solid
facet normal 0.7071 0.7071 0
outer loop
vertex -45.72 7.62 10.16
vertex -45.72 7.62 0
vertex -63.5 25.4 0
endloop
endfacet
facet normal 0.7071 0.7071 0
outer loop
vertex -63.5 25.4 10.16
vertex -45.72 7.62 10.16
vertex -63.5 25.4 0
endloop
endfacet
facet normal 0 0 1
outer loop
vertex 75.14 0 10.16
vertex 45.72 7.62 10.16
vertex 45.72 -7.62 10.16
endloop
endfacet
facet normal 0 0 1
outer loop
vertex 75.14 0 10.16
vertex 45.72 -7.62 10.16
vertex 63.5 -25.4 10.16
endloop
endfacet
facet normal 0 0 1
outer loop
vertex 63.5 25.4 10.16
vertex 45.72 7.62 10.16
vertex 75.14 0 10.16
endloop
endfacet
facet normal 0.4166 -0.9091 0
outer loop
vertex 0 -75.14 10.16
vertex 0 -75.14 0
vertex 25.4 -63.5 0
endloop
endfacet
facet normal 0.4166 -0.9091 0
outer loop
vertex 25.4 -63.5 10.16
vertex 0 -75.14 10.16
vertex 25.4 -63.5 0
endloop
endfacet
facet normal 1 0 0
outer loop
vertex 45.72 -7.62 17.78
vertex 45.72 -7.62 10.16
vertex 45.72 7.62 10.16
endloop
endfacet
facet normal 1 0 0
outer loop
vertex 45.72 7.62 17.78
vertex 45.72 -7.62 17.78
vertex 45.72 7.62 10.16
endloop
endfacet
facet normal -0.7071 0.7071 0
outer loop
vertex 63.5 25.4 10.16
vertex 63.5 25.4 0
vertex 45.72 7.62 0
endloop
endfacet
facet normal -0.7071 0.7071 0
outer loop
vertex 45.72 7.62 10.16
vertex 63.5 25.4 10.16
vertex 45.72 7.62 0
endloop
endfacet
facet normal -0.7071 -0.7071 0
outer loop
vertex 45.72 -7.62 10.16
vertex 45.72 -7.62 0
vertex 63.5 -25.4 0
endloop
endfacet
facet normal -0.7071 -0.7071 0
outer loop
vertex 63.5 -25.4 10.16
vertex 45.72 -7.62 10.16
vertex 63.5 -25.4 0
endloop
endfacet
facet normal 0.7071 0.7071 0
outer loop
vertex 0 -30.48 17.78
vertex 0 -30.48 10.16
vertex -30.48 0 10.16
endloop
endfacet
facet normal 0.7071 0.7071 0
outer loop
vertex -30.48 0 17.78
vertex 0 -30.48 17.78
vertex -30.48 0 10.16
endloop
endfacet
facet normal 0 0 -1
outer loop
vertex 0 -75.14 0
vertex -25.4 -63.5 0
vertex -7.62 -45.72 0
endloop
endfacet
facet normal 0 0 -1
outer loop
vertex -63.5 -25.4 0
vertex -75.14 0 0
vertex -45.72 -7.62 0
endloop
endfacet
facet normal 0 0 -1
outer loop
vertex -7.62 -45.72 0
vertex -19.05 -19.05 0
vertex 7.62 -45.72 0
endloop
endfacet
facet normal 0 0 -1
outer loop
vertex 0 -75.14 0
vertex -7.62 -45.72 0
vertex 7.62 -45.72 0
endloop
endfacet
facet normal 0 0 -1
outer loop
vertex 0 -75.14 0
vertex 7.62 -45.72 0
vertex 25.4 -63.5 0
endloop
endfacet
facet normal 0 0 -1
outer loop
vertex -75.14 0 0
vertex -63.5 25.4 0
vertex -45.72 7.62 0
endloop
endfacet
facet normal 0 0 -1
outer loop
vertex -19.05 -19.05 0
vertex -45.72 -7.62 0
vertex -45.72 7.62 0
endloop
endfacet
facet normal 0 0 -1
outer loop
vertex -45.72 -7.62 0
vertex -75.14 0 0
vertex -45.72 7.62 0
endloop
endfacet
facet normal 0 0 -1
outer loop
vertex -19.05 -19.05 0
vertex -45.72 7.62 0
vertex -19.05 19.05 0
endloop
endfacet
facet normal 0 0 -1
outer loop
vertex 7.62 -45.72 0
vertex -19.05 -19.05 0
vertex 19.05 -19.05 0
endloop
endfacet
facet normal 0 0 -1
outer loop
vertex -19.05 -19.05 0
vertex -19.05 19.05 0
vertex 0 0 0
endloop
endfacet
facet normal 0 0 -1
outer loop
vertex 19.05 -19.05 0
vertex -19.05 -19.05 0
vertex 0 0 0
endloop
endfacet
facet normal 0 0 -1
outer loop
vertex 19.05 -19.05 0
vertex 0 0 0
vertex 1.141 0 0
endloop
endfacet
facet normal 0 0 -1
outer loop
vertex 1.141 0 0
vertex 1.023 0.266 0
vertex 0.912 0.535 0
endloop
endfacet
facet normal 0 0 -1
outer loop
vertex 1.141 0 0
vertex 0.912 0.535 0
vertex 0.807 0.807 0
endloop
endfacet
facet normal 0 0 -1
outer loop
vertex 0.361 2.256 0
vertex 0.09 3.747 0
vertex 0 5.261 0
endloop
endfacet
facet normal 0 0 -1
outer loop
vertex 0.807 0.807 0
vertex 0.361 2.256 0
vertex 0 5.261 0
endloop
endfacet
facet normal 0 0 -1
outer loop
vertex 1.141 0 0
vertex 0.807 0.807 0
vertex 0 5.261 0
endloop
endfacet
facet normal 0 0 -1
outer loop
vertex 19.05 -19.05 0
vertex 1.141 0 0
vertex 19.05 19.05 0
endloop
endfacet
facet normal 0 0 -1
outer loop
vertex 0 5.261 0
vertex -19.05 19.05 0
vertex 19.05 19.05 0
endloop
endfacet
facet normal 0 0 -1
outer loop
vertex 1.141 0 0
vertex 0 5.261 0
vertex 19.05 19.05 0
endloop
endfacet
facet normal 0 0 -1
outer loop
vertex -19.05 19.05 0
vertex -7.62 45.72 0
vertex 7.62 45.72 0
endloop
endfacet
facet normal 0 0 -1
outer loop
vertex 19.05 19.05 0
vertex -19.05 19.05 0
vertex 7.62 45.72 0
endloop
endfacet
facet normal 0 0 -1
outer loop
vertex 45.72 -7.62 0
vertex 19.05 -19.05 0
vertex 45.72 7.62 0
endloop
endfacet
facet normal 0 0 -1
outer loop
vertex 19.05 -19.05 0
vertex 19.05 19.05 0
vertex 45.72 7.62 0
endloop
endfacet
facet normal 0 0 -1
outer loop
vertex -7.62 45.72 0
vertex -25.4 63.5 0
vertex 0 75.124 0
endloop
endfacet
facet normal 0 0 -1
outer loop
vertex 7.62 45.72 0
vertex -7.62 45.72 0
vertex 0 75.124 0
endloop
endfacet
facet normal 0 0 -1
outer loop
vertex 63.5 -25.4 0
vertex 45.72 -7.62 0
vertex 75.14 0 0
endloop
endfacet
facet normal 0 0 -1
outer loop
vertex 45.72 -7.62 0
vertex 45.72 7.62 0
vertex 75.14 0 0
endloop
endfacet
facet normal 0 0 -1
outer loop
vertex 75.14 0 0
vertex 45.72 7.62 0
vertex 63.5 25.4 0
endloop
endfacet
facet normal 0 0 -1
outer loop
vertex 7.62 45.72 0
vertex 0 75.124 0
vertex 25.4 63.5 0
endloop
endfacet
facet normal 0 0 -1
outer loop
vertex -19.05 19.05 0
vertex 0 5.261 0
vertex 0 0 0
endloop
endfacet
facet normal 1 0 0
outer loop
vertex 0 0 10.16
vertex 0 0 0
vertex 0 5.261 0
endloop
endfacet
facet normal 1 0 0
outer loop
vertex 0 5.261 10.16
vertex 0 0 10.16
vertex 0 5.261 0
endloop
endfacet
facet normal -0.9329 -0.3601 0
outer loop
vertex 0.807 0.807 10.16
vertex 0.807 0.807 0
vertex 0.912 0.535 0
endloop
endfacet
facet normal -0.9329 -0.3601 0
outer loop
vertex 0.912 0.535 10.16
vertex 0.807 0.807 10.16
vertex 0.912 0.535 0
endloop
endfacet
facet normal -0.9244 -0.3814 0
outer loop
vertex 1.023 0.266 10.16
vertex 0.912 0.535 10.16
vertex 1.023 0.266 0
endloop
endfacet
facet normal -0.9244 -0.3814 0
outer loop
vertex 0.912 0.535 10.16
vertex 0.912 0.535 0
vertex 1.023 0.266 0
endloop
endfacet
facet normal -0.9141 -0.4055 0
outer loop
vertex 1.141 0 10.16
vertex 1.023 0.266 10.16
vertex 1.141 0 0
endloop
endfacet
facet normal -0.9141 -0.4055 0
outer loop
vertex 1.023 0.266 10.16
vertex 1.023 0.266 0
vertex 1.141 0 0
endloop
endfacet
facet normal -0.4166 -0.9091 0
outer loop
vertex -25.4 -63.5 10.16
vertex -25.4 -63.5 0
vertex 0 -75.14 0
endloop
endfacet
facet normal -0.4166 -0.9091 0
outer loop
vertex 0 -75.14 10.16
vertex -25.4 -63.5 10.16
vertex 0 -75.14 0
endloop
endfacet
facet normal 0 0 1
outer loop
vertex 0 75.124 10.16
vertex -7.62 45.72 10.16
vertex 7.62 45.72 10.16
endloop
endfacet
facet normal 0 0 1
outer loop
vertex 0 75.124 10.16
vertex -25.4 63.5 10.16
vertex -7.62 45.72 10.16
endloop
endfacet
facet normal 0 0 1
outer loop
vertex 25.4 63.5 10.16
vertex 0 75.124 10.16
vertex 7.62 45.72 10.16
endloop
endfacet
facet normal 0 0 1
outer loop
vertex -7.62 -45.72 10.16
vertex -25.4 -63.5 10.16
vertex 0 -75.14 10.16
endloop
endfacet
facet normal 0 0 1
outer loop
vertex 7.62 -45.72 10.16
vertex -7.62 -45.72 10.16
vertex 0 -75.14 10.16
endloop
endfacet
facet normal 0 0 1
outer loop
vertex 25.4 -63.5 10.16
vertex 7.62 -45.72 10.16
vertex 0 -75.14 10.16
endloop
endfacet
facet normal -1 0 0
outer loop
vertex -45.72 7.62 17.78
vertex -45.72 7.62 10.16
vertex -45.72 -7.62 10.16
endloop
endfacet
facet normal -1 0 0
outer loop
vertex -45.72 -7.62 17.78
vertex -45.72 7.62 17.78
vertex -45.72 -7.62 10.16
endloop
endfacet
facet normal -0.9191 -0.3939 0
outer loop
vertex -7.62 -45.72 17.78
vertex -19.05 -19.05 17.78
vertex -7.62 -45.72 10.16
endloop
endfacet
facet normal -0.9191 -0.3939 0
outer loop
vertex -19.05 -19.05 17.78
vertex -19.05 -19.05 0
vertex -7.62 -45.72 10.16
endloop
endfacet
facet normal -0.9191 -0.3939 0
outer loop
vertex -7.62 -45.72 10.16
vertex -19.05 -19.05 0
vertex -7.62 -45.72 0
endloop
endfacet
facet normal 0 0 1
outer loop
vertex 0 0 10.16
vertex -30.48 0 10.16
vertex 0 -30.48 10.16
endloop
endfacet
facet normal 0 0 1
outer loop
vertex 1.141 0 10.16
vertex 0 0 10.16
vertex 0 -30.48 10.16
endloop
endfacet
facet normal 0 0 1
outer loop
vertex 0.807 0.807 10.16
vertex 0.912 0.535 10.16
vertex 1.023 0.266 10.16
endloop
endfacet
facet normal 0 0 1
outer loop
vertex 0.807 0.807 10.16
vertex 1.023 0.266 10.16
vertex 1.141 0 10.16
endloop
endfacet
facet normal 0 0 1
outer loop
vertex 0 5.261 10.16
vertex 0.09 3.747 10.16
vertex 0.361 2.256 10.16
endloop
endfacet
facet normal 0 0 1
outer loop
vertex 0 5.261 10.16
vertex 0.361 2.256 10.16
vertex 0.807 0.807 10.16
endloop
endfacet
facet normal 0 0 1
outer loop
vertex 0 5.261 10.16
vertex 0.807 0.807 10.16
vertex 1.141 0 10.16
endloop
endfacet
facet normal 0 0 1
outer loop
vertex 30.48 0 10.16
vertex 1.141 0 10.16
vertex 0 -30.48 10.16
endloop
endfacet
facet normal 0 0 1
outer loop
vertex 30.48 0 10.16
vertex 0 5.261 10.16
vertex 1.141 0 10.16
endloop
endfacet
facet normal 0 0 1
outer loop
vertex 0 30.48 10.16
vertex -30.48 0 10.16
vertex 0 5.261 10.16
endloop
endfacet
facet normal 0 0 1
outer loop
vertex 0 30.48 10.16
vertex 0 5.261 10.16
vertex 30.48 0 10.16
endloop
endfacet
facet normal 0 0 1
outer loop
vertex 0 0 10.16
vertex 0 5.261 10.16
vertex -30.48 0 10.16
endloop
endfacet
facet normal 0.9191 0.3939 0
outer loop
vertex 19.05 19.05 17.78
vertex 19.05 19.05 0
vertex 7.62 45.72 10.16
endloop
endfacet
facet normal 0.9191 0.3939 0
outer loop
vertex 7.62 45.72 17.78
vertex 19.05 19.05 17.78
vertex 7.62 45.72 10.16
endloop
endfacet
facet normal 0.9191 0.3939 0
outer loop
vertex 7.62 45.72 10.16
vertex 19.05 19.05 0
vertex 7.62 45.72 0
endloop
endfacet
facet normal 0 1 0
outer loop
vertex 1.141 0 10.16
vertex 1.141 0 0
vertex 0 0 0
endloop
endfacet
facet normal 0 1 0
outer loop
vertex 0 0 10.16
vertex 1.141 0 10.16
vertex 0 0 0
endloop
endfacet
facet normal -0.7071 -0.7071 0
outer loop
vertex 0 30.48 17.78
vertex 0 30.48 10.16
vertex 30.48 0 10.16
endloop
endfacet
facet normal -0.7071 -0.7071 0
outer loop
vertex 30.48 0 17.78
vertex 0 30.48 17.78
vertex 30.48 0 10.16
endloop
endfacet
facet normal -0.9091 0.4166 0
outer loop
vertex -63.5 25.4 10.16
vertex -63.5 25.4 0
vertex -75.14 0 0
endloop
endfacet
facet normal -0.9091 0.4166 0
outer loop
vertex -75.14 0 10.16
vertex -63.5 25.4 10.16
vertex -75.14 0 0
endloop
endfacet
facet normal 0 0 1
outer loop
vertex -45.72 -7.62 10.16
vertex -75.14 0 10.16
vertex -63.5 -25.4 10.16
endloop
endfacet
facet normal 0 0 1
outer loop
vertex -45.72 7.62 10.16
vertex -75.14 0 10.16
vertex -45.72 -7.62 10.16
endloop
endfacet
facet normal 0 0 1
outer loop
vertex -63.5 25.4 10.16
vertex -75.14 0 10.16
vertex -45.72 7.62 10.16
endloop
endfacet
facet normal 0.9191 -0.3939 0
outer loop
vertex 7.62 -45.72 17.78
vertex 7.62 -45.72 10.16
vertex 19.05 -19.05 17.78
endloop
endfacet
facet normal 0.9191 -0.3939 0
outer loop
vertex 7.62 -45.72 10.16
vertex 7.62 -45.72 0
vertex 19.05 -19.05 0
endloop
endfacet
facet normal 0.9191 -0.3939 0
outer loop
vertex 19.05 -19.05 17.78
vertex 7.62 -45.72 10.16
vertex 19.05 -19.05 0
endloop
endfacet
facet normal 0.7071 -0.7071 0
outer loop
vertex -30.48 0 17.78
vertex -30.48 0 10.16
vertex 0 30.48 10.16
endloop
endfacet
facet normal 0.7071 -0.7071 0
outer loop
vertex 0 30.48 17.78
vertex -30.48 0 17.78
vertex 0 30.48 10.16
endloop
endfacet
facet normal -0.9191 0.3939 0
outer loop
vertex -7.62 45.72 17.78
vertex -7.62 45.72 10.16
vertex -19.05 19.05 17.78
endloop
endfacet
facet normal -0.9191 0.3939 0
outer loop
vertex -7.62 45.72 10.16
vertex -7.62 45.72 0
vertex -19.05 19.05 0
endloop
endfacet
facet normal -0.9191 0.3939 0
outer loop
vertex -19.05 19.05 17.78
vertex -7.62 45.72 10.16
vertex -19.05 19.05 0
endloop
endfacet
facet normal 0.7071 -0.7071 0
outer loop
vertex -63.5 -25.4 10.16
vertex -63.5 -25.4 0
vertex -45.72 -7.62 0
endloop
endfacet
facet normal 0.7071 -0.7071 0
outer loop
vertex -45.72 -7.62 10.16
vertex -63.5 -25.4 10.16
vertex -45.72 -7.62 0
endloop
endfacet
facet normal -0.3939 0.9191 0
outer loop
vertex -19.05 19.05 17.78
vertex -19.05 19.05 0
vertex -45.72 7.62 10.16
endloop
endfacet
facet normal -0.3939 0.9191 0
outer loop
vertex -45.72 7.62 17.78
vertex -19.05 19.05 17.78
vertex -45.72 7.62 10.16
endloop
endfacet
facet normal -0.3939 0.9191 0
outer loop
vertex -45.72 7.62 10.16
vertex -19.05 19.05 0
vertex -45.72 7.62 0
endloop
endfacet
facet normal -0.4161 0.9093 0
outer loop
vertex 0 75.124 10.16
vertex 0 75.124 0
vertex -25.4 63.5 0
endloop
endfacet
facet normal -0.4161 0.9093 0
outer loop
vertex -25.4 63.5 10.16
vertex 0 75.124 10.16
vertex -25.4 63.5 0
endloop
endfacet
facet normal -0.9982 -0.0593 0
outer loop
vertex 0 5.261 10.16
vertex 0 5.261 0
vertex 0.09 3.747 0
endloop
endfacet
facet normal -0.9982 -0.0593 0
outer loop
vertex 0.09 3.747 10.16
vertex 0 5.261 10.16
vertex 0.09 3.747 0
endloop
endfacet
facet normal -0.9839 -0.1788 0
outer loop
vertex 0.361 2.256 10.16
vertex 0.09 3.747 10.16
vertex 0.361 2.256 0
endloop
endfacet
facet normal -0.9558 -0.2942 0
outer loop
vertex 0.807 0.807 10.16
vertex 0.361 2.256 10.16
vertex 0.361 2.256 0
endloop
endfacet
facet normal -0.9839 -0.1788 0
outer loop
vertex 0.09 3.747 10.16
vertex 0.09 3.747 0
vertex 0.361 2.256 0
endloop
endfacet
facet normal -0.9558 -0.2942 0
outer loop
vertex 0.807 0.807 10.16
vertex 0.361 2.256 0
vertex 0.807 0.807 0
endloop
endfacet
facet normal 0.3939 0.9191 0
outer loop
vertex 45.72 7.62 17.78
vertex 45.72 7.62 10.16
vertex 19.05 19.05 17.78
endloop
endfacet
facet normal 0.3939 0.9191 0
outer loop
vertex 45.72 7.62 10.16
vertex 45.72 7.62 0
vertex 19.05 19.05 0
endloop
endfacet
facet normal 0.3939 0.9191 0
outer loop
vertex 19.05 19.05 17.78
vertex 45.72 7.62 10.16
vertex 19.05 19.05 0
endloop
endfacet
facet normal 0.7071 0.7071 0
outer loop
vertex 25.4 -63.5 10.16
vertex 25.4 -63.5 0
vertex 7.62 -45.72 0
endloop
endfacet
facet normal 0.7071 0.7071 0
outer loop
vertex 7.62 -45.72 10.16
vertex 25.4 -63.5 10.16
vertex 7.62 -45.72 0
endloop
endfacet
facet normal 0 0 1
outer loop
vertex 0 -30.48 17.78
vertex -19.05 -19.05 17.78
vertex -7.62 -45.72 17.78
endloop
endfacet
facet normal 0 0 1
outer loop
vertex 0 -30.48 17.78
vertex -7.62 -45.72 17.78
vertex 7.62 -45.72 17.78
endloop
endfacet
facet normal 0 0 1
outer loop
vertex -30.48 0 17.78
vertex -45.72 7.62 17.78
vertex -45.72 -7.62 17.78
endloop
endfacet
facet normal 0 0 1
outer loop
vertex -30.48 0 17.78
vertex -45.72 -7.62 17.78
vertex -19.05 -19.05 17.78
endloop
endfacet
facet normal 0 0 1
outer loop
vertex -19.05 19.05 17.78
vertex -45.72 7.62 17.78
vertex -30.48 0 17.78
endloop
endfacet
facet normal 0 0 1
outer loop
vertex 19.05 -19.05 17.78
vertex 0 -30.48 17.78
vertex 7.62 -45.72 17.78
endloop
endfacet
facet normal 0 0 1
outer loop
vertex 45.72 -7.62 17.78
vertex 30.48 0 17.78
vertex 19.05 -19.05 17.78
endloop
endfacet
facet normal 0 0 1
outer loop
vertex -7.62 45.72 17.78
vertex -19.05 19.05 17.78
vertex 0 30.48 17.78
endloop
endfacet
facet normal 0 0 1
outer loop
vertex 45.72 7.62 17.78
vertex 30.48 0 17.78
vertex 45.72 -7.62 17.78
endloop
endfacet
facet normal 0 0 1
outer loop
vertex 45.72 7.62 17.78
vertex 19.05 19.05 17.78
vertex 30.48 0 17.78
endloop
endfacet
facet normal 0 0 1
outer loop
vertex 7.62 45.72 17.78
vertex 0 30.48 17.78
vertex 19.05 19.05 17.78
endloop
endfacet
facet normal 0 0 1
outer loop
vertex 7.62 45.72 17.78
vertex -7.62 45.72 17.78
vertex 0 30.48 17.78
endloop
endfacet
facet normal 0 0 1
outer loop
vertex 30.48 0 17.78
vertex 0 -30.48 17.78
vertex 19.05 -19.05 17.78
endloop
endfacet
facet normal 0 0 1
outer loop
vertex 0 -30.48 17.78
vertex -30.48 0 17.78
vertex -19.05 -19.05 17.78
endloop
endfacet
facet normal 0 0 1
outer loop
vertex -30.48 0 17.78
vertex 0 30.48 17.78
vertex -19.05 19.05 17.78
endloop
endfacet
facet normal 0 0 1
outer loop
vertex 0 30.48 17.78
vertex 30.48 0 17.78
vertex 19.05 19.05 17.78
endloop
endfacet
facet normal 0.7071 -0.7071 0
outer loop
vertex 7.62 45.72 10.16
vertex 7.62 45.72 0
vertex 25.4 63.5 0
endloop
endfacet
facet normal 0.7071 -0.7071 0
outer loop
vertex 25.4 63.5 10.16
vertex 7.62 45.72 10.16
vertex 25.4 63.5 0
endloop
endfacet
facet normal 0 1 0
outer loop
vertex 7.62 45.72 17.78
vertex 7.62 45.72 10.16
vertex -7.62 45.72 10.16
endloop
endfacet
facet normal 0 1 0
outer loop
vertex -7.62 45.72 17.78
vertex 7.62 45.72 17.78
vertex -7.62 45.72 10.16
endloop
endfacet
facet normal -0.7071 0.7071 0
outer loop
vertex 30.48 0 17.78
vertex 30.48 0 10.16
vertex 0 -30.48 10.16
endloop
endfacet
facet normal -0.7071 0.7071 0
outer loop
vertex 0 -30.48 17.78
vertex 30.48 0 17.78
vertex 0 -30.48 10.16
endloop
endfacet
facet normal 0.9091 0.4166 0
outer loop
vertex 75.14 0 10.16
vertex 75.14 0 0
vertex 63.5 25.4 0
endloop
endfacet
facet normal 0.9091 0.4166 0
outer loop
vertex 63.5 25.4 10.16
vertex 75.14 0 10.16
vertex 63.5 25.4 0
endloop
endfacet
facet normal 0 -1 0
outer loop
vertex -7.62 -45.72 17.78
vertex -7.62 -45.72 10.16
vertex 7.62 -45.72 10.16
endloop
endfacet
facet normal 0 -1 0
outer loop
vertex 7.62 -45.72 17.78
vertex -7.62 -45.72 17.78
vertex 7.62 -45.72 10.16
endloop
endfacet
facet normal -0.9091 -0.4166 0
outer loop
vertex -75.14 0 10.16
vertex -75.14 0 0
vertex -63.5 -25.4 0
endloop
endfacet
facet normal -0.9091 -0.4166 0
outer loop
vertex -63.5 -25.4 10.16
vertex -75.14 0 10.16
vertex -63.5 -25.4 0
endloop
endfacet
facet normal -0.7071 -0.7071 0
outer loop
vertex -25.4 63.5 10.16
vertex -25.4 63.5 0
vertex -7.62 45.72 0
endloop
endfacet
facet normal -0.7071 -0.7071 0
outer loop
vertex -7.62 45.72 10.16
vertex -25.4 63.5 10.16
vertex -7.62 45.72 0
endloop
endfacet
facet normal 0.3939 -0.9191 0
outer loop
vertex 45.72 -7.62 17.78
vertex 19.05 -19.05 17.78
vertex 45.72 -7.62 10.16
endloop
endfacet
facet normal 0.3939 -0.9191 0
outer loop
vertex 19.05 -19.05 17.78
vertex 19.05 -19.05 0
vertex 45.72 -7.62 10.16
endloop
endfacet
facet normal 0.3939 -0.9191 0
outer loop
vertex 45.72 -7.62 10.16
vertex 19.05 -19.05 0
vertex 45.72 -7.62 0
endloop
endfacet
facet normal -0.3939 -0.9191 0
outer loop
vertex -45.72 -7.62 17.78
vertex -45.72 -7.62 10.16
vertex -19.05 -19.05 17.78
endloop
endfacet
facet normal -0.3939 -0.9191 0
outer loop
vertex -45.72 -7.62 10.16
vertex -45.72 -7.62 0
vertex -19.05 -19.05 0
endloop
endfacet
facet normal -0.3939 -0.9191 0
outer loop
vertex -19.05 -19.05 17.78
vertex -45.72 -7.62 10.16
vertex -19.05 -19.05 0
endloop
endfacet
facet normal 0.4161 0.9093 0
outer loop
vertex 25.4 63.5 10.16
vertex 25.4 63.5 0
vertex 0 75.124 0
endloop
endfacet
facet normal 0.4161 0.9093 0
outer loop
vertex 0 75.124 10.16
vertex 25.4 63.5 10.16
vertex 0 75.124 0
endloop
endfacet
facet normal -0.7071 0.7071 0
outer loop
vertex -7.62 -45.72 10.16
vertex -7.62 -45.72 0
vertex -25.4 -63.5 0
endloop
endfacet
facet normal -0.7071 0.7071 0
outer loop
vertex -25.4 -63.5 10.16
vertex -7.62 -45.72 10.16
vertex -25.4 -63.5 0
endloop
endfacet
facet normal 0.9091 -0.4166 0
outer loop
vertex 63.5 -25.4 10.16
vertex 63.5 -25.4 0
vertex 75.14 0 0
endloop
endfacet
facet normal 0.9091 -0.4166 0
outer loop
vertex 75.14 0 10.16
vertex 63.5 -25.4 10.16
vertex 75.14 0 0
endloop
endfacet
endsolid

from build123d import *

# Parameters (mm, degrees)
F1_DEPTH = 10.16
F3_DEPTH = 7.62


# Not quite as in the source:
# - a feature names something its author has since deleted; it is built from what else it names


with BuildPart() as f1:
    # F0 (on Top) → F1 (new body)
    with BuildSketch(Plane.XY):
        Polygon((-19.05, 19.05), (0, 0), (0, 5.2605122421), (0, 38.1), align=None)
        with BuildLine():
            Line((1.1407175417, 0), (0, 0))
            Line((0, 0), (0, -38.1))
            Line((0, -38.1), (19.05, -19.05))
            Line((19.05, -19.05), (3.7197438789, -3.7197438789))
            ThreePointArc((3.7197438789, -3.7197438789), (2.263176494, -1.9756963719), (1.1407175417, 0))
        make_face()
        Polygon((-19.05, -19.05), (0, 0), (-38.1, 0), align=None)
        Polygon((-38.1, 0), (0, 0), (-19.05, 19.05), align=None)
        Polygon((0, -38.1), (0, 0), (-19.05, -19.05), align=None)
        with BuildLine():
            Line((0, 38.1), (0, 5.2605122421))
            ThreePointArc((0, 5.2605122421), (0.2032791438, 2.9973357481), (0.8066091092, 0.8066091092))
            Line((0.8066091092, 0.8066091092), (19.05, 19.05))
            Line((19.05, 19.05), (0, 38.1))
        make_face()
        with BuildLine():
            ThreePointArc((0.8066091092, 0.8066091092), (0.9667299371, 0.4004326511), (1.1407175417, 0))
            Line((1.1407175417, 0), (38.1, 0))
            Line((38.1, 0), (19.05, 19.05))
            Line((19.05, 19.05), (0.8066091092, 0.8066091092))
        make_face()
        with BuildLine():
            Line((38.1, 0), (1.1407175417, 0))
            ThreePointArc((1.1407175417, 0), (2.263176494, -1.9756963719), (3.7197438789, -3.7197438789))
            Line((3.7197438789, -3.7197438789), (19.05, -19.05))
            Line((19.05, -19.05), (38.1, 0))
        make_face()
        Polygon((7.62, -45.72), (0, -38.1), (0, -63.5), align=None)
        Polygon((-7.62, -45.72), (0, -38.1), (-19.05, -19.05), align=None)
        Polygon((19.05, -19.05), (0, -38.1), (7.62, -45.72), align=None)
        Polygon((0, -63.5), (0, -38.1), (-7.62, -45.72), align=None)
        Polygon((-45.72, -7.62), (-38.1, 0), (-63.5, 0), align=None)
        Polygon((-45.72, 7.62), (-38.1, 0), (-19.05, 19.05), align=None)
        Polygon((-63.5, 0), (-38.1, 0), (-45.72, 7.62), align=None)
        Polygon((-19.05, -19.05), (-38.1, 0), (-45.72, -7.62), align=None)
        Polygon((-7.62, 45.72), (-19.05, 19.05), (0, 38.1), align=None)
        Polygon((-7.62, 45.72), (0, 38.1), (0, 63.5), align=None)
        Polygon((7.62, 45.72), (0, 38.1), (19.05, 19.05), align=None)
        Polygon((0, 63.5), (0, 38.1), (7.62, 45.72), align=None)
        Polygon((45.72, 7.62), (38.1, 0), (63.5, 0), align=None)
        Polygon((45.72, -7.62), (38.1, 0), (19.05, -19.05), align=None)
        Polygon((19.05, 19.05), (38.1, 0), (45.72, 7.62), align=None)
        Polygon((63.5, 0), (38.1, 0), (45.72, -7.62), align=None)
        Polygon((7.62, -45.72), (0, -63.5), (-7.62, -45.72), (-25.4, -63.5), (0, -75.1397422652), (25.4, -63.5), align=None)
        Polygon((-45.72, -7.62), (-63.5, 0), (-45.72, 7.62), (-63.5, 25.4), (-75.1397422652, 0), (-63.5, -25.4), align=None)
        Polygon((-25.4, 63.5), (-7.62, 45.72), (0, 63.5), (7.62, 45.72), (25.4, 63.5), (0, 75.1238912344), align=None)
        Polygon((45.72, 7.62), (63.5, 0), (45.72, -7.62), (63.5, -25.4), (75.1397422652, 0), (63.5, 25.4), align=None)
    extrude(amount=F1_DEPTH)

    # F2 (on face) → F3 (join)
    with BuildSketch(Plane.XY.offset(10.16)):
        Polygon((-19.05, 19.05), (-45.72, 7.62), (-45.72, -7.62), (-19.05, -19.05), (-7.62, -45.72), (7.62, -45.72), (19.05, -19.05), (45.72, -7.62), (45.72, 7.62), (19.05, 19.05), (7.62, 45.72), (-7.62, 45.72), align=None)
        Polygon((0, -30.48), (-30.48, 0), (0, 30.48), (30.48, 0), align=None, mode=Mode.SUBTRACT)
    extrude(amount=F3_DEPTH)


solid = f1.part
